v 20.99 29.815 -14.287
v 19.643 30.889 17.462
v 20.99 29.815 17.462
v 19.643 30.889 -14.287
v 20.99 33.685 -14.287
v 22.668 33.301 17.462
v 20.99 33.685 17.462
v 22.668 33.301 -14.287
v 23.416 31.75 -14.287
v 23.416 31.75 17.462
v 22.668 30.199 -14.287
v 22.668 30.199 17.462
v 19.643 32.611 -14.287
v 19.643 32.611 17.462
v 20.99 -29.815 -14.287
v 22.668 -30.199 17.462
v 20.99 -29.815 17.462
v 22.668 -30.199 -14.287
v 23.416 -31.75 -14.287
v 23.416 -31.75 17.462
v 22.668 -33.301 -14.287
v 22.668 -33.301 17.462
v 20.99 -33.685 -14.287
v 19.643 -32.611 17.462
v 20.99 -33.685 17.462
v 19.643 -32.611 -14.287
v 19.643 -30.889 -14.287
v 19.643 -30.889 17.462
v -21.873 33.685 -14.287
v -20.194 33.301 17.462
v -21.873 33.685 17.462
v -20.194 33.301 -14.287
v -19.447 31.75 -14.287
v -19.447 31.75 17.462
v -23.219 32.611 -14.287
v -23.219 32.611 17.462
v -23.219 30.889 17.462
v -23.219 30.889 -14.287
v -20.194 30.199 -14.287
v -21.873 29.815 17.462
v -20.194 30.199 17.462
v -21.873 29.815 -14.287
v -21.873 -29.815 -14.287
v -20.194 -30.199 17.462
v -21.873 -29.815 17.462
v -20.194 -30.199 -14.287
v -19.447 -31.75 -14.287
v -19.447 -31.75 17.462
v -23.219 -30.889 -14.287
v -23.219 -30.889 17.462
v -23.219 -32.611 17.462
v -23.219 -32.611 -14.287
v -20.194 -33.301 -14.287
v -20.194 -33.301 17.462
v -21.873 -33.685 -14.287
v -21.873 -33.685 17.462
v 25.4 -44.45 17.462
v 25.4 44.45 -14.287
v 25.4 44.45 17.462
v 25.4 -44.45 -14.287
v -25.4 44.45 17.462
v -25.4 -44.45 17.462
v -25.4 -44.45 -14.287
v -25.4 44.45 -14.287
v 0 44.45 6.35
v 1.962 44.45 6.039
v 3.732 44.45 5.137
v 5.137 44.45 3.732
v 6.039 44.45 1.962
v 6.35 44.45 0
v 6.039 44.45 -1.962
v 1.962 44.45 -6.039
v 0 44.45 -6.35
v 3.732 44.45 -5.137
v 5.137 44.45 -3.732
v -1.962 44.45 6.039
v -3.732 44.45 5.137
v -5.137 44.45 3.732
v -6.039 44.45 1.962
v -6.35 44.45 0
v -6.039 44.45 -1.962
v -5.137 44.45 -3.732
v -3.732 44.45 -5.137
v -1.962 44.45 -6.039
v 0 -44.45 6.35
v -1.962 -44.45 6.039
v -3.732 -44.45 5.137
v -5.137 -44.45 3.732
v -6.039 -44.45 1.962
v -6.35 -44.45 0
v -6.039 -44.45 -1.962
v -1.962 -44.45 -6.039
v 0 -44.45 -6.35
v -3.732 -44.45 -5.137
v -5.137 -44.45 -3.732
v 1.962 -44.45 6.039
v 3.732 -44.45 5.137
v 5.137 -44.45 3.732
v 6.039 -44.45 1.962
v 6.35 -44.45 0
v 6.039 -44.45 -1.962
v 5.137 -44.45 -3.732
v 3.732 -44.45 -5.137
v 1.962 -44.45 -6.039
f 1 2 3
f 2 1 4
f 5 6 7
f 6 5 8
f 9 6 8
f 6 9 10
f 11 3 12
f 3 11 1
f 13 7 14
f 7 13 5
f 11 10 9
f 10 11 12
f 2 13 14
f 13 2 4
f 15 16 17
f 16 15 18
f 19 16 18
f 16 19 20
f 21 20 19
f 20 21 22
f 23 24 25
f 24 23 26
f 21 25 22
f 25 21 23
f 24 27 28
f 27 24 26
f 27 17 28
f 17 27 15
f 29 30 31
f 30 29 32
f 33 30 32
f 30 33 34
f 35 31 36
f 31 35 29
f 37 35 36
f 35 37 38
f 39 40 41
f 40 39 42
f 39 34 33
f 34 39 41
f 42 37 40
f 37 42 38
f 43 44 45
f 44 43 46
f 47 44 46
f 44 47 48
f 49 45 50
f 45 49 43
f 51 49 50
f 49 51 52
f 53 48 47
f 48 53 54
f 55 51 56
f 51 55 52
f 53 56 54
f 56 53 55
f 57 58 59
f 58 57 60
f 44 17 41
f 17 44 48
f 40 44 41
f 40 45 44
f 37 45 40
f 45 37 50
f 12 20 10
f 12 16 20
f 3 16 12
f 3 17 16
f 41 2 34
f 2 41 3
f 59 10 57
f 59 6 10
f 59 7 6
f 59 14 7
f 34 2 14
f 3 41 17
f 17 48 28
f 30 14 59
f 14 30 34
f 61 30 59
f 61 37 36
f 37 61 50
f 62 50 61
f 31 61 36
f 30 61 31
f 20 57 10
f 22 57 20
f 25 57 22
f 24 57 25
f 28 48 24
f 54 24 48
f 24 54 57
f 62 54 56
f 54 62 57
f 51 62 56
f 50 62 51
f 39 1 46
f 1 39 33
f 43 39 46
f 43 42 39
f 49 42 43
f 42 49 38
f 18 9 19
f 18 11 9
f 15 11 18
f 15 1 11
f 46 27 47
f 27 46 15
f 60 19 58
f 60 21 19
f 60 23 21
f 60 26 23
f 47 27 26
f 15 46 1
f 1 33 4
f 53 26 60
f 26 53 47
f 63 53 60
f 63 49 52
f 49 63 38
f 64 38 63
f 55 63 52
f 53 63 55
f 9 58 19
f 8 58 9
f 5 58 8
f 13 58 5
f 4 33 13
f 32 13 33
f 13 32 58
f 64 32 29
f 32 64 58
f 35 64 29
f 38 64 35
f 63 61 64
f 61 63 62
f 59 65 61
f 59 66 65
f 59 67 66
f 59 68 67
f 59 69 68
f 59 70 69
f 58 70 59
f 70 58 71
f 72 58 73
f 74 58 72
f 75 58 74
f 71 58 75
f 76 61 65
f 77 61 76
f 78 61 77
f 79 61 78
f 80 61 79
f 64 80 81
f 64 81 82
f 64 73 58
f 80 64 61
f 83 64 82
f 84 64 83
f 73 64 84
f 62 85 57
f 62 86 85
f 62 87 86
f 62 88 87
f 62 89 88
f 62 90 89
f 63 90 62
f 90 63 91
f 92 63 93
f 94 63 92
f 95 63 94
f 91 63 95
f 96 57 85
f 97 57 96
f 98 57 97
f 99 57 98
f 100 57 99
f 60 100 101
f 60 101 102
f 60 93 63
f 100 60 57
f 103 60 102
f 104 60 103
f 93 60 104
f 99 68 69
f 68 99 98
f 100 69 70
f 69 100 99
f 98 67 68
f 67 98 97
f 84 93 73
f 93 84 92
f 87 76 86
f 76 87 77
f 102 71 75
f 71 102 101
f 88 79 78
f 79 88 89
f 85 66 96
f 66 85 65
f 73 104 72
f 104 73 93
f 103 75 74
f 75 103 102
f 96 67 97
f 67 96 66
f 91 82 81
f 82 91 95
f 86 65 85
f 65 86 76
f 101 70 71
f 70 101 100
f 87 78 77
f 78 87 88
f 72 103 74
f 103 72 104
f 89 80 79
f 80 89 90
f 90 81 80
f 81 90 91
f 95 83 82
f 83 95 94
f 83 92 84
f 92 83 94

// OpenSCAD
overlap = 0.05;

function in_to_mm(in) = in*25.4;

block_len = in_to_mm(3.5);
block_width = in_to_mm(2);
top_to_shaft = in_to_mm(11.0/16.0);
block_height = in_to_mm(1.25);
hole_dia = in_to_mm(5.0/32.0);
hole_y_dist = in_to_mm(2.5);
hole_x_dist = in_to_mm(1.0 + (11.0/16.0));
shaft_dia = in_to_mm(0.5);

// Origin at center of shaft, center of block. Block aligned along y axis.
module pillow_block() {
    difference() {
	// block
	translate([0,0,top_to_shaft-block_height/2])
	cube(size=[block_width,block_len,block_height],center=true);
	rotate([90,0,0]) cylinder(d=shaft_dia,h=block_len+overlap,center=true);
	for (x = [hole_x_dist/2, -hole_x_dist/2]) {
	    for (y = [hole_y_dist/2,-hole_y_dist/2]) {
		translate([x,y,0])
		cylinder(d=hole_dia,h=2*block_height,center=true);
	    }
	}
   }
}

pillow_block();

    
